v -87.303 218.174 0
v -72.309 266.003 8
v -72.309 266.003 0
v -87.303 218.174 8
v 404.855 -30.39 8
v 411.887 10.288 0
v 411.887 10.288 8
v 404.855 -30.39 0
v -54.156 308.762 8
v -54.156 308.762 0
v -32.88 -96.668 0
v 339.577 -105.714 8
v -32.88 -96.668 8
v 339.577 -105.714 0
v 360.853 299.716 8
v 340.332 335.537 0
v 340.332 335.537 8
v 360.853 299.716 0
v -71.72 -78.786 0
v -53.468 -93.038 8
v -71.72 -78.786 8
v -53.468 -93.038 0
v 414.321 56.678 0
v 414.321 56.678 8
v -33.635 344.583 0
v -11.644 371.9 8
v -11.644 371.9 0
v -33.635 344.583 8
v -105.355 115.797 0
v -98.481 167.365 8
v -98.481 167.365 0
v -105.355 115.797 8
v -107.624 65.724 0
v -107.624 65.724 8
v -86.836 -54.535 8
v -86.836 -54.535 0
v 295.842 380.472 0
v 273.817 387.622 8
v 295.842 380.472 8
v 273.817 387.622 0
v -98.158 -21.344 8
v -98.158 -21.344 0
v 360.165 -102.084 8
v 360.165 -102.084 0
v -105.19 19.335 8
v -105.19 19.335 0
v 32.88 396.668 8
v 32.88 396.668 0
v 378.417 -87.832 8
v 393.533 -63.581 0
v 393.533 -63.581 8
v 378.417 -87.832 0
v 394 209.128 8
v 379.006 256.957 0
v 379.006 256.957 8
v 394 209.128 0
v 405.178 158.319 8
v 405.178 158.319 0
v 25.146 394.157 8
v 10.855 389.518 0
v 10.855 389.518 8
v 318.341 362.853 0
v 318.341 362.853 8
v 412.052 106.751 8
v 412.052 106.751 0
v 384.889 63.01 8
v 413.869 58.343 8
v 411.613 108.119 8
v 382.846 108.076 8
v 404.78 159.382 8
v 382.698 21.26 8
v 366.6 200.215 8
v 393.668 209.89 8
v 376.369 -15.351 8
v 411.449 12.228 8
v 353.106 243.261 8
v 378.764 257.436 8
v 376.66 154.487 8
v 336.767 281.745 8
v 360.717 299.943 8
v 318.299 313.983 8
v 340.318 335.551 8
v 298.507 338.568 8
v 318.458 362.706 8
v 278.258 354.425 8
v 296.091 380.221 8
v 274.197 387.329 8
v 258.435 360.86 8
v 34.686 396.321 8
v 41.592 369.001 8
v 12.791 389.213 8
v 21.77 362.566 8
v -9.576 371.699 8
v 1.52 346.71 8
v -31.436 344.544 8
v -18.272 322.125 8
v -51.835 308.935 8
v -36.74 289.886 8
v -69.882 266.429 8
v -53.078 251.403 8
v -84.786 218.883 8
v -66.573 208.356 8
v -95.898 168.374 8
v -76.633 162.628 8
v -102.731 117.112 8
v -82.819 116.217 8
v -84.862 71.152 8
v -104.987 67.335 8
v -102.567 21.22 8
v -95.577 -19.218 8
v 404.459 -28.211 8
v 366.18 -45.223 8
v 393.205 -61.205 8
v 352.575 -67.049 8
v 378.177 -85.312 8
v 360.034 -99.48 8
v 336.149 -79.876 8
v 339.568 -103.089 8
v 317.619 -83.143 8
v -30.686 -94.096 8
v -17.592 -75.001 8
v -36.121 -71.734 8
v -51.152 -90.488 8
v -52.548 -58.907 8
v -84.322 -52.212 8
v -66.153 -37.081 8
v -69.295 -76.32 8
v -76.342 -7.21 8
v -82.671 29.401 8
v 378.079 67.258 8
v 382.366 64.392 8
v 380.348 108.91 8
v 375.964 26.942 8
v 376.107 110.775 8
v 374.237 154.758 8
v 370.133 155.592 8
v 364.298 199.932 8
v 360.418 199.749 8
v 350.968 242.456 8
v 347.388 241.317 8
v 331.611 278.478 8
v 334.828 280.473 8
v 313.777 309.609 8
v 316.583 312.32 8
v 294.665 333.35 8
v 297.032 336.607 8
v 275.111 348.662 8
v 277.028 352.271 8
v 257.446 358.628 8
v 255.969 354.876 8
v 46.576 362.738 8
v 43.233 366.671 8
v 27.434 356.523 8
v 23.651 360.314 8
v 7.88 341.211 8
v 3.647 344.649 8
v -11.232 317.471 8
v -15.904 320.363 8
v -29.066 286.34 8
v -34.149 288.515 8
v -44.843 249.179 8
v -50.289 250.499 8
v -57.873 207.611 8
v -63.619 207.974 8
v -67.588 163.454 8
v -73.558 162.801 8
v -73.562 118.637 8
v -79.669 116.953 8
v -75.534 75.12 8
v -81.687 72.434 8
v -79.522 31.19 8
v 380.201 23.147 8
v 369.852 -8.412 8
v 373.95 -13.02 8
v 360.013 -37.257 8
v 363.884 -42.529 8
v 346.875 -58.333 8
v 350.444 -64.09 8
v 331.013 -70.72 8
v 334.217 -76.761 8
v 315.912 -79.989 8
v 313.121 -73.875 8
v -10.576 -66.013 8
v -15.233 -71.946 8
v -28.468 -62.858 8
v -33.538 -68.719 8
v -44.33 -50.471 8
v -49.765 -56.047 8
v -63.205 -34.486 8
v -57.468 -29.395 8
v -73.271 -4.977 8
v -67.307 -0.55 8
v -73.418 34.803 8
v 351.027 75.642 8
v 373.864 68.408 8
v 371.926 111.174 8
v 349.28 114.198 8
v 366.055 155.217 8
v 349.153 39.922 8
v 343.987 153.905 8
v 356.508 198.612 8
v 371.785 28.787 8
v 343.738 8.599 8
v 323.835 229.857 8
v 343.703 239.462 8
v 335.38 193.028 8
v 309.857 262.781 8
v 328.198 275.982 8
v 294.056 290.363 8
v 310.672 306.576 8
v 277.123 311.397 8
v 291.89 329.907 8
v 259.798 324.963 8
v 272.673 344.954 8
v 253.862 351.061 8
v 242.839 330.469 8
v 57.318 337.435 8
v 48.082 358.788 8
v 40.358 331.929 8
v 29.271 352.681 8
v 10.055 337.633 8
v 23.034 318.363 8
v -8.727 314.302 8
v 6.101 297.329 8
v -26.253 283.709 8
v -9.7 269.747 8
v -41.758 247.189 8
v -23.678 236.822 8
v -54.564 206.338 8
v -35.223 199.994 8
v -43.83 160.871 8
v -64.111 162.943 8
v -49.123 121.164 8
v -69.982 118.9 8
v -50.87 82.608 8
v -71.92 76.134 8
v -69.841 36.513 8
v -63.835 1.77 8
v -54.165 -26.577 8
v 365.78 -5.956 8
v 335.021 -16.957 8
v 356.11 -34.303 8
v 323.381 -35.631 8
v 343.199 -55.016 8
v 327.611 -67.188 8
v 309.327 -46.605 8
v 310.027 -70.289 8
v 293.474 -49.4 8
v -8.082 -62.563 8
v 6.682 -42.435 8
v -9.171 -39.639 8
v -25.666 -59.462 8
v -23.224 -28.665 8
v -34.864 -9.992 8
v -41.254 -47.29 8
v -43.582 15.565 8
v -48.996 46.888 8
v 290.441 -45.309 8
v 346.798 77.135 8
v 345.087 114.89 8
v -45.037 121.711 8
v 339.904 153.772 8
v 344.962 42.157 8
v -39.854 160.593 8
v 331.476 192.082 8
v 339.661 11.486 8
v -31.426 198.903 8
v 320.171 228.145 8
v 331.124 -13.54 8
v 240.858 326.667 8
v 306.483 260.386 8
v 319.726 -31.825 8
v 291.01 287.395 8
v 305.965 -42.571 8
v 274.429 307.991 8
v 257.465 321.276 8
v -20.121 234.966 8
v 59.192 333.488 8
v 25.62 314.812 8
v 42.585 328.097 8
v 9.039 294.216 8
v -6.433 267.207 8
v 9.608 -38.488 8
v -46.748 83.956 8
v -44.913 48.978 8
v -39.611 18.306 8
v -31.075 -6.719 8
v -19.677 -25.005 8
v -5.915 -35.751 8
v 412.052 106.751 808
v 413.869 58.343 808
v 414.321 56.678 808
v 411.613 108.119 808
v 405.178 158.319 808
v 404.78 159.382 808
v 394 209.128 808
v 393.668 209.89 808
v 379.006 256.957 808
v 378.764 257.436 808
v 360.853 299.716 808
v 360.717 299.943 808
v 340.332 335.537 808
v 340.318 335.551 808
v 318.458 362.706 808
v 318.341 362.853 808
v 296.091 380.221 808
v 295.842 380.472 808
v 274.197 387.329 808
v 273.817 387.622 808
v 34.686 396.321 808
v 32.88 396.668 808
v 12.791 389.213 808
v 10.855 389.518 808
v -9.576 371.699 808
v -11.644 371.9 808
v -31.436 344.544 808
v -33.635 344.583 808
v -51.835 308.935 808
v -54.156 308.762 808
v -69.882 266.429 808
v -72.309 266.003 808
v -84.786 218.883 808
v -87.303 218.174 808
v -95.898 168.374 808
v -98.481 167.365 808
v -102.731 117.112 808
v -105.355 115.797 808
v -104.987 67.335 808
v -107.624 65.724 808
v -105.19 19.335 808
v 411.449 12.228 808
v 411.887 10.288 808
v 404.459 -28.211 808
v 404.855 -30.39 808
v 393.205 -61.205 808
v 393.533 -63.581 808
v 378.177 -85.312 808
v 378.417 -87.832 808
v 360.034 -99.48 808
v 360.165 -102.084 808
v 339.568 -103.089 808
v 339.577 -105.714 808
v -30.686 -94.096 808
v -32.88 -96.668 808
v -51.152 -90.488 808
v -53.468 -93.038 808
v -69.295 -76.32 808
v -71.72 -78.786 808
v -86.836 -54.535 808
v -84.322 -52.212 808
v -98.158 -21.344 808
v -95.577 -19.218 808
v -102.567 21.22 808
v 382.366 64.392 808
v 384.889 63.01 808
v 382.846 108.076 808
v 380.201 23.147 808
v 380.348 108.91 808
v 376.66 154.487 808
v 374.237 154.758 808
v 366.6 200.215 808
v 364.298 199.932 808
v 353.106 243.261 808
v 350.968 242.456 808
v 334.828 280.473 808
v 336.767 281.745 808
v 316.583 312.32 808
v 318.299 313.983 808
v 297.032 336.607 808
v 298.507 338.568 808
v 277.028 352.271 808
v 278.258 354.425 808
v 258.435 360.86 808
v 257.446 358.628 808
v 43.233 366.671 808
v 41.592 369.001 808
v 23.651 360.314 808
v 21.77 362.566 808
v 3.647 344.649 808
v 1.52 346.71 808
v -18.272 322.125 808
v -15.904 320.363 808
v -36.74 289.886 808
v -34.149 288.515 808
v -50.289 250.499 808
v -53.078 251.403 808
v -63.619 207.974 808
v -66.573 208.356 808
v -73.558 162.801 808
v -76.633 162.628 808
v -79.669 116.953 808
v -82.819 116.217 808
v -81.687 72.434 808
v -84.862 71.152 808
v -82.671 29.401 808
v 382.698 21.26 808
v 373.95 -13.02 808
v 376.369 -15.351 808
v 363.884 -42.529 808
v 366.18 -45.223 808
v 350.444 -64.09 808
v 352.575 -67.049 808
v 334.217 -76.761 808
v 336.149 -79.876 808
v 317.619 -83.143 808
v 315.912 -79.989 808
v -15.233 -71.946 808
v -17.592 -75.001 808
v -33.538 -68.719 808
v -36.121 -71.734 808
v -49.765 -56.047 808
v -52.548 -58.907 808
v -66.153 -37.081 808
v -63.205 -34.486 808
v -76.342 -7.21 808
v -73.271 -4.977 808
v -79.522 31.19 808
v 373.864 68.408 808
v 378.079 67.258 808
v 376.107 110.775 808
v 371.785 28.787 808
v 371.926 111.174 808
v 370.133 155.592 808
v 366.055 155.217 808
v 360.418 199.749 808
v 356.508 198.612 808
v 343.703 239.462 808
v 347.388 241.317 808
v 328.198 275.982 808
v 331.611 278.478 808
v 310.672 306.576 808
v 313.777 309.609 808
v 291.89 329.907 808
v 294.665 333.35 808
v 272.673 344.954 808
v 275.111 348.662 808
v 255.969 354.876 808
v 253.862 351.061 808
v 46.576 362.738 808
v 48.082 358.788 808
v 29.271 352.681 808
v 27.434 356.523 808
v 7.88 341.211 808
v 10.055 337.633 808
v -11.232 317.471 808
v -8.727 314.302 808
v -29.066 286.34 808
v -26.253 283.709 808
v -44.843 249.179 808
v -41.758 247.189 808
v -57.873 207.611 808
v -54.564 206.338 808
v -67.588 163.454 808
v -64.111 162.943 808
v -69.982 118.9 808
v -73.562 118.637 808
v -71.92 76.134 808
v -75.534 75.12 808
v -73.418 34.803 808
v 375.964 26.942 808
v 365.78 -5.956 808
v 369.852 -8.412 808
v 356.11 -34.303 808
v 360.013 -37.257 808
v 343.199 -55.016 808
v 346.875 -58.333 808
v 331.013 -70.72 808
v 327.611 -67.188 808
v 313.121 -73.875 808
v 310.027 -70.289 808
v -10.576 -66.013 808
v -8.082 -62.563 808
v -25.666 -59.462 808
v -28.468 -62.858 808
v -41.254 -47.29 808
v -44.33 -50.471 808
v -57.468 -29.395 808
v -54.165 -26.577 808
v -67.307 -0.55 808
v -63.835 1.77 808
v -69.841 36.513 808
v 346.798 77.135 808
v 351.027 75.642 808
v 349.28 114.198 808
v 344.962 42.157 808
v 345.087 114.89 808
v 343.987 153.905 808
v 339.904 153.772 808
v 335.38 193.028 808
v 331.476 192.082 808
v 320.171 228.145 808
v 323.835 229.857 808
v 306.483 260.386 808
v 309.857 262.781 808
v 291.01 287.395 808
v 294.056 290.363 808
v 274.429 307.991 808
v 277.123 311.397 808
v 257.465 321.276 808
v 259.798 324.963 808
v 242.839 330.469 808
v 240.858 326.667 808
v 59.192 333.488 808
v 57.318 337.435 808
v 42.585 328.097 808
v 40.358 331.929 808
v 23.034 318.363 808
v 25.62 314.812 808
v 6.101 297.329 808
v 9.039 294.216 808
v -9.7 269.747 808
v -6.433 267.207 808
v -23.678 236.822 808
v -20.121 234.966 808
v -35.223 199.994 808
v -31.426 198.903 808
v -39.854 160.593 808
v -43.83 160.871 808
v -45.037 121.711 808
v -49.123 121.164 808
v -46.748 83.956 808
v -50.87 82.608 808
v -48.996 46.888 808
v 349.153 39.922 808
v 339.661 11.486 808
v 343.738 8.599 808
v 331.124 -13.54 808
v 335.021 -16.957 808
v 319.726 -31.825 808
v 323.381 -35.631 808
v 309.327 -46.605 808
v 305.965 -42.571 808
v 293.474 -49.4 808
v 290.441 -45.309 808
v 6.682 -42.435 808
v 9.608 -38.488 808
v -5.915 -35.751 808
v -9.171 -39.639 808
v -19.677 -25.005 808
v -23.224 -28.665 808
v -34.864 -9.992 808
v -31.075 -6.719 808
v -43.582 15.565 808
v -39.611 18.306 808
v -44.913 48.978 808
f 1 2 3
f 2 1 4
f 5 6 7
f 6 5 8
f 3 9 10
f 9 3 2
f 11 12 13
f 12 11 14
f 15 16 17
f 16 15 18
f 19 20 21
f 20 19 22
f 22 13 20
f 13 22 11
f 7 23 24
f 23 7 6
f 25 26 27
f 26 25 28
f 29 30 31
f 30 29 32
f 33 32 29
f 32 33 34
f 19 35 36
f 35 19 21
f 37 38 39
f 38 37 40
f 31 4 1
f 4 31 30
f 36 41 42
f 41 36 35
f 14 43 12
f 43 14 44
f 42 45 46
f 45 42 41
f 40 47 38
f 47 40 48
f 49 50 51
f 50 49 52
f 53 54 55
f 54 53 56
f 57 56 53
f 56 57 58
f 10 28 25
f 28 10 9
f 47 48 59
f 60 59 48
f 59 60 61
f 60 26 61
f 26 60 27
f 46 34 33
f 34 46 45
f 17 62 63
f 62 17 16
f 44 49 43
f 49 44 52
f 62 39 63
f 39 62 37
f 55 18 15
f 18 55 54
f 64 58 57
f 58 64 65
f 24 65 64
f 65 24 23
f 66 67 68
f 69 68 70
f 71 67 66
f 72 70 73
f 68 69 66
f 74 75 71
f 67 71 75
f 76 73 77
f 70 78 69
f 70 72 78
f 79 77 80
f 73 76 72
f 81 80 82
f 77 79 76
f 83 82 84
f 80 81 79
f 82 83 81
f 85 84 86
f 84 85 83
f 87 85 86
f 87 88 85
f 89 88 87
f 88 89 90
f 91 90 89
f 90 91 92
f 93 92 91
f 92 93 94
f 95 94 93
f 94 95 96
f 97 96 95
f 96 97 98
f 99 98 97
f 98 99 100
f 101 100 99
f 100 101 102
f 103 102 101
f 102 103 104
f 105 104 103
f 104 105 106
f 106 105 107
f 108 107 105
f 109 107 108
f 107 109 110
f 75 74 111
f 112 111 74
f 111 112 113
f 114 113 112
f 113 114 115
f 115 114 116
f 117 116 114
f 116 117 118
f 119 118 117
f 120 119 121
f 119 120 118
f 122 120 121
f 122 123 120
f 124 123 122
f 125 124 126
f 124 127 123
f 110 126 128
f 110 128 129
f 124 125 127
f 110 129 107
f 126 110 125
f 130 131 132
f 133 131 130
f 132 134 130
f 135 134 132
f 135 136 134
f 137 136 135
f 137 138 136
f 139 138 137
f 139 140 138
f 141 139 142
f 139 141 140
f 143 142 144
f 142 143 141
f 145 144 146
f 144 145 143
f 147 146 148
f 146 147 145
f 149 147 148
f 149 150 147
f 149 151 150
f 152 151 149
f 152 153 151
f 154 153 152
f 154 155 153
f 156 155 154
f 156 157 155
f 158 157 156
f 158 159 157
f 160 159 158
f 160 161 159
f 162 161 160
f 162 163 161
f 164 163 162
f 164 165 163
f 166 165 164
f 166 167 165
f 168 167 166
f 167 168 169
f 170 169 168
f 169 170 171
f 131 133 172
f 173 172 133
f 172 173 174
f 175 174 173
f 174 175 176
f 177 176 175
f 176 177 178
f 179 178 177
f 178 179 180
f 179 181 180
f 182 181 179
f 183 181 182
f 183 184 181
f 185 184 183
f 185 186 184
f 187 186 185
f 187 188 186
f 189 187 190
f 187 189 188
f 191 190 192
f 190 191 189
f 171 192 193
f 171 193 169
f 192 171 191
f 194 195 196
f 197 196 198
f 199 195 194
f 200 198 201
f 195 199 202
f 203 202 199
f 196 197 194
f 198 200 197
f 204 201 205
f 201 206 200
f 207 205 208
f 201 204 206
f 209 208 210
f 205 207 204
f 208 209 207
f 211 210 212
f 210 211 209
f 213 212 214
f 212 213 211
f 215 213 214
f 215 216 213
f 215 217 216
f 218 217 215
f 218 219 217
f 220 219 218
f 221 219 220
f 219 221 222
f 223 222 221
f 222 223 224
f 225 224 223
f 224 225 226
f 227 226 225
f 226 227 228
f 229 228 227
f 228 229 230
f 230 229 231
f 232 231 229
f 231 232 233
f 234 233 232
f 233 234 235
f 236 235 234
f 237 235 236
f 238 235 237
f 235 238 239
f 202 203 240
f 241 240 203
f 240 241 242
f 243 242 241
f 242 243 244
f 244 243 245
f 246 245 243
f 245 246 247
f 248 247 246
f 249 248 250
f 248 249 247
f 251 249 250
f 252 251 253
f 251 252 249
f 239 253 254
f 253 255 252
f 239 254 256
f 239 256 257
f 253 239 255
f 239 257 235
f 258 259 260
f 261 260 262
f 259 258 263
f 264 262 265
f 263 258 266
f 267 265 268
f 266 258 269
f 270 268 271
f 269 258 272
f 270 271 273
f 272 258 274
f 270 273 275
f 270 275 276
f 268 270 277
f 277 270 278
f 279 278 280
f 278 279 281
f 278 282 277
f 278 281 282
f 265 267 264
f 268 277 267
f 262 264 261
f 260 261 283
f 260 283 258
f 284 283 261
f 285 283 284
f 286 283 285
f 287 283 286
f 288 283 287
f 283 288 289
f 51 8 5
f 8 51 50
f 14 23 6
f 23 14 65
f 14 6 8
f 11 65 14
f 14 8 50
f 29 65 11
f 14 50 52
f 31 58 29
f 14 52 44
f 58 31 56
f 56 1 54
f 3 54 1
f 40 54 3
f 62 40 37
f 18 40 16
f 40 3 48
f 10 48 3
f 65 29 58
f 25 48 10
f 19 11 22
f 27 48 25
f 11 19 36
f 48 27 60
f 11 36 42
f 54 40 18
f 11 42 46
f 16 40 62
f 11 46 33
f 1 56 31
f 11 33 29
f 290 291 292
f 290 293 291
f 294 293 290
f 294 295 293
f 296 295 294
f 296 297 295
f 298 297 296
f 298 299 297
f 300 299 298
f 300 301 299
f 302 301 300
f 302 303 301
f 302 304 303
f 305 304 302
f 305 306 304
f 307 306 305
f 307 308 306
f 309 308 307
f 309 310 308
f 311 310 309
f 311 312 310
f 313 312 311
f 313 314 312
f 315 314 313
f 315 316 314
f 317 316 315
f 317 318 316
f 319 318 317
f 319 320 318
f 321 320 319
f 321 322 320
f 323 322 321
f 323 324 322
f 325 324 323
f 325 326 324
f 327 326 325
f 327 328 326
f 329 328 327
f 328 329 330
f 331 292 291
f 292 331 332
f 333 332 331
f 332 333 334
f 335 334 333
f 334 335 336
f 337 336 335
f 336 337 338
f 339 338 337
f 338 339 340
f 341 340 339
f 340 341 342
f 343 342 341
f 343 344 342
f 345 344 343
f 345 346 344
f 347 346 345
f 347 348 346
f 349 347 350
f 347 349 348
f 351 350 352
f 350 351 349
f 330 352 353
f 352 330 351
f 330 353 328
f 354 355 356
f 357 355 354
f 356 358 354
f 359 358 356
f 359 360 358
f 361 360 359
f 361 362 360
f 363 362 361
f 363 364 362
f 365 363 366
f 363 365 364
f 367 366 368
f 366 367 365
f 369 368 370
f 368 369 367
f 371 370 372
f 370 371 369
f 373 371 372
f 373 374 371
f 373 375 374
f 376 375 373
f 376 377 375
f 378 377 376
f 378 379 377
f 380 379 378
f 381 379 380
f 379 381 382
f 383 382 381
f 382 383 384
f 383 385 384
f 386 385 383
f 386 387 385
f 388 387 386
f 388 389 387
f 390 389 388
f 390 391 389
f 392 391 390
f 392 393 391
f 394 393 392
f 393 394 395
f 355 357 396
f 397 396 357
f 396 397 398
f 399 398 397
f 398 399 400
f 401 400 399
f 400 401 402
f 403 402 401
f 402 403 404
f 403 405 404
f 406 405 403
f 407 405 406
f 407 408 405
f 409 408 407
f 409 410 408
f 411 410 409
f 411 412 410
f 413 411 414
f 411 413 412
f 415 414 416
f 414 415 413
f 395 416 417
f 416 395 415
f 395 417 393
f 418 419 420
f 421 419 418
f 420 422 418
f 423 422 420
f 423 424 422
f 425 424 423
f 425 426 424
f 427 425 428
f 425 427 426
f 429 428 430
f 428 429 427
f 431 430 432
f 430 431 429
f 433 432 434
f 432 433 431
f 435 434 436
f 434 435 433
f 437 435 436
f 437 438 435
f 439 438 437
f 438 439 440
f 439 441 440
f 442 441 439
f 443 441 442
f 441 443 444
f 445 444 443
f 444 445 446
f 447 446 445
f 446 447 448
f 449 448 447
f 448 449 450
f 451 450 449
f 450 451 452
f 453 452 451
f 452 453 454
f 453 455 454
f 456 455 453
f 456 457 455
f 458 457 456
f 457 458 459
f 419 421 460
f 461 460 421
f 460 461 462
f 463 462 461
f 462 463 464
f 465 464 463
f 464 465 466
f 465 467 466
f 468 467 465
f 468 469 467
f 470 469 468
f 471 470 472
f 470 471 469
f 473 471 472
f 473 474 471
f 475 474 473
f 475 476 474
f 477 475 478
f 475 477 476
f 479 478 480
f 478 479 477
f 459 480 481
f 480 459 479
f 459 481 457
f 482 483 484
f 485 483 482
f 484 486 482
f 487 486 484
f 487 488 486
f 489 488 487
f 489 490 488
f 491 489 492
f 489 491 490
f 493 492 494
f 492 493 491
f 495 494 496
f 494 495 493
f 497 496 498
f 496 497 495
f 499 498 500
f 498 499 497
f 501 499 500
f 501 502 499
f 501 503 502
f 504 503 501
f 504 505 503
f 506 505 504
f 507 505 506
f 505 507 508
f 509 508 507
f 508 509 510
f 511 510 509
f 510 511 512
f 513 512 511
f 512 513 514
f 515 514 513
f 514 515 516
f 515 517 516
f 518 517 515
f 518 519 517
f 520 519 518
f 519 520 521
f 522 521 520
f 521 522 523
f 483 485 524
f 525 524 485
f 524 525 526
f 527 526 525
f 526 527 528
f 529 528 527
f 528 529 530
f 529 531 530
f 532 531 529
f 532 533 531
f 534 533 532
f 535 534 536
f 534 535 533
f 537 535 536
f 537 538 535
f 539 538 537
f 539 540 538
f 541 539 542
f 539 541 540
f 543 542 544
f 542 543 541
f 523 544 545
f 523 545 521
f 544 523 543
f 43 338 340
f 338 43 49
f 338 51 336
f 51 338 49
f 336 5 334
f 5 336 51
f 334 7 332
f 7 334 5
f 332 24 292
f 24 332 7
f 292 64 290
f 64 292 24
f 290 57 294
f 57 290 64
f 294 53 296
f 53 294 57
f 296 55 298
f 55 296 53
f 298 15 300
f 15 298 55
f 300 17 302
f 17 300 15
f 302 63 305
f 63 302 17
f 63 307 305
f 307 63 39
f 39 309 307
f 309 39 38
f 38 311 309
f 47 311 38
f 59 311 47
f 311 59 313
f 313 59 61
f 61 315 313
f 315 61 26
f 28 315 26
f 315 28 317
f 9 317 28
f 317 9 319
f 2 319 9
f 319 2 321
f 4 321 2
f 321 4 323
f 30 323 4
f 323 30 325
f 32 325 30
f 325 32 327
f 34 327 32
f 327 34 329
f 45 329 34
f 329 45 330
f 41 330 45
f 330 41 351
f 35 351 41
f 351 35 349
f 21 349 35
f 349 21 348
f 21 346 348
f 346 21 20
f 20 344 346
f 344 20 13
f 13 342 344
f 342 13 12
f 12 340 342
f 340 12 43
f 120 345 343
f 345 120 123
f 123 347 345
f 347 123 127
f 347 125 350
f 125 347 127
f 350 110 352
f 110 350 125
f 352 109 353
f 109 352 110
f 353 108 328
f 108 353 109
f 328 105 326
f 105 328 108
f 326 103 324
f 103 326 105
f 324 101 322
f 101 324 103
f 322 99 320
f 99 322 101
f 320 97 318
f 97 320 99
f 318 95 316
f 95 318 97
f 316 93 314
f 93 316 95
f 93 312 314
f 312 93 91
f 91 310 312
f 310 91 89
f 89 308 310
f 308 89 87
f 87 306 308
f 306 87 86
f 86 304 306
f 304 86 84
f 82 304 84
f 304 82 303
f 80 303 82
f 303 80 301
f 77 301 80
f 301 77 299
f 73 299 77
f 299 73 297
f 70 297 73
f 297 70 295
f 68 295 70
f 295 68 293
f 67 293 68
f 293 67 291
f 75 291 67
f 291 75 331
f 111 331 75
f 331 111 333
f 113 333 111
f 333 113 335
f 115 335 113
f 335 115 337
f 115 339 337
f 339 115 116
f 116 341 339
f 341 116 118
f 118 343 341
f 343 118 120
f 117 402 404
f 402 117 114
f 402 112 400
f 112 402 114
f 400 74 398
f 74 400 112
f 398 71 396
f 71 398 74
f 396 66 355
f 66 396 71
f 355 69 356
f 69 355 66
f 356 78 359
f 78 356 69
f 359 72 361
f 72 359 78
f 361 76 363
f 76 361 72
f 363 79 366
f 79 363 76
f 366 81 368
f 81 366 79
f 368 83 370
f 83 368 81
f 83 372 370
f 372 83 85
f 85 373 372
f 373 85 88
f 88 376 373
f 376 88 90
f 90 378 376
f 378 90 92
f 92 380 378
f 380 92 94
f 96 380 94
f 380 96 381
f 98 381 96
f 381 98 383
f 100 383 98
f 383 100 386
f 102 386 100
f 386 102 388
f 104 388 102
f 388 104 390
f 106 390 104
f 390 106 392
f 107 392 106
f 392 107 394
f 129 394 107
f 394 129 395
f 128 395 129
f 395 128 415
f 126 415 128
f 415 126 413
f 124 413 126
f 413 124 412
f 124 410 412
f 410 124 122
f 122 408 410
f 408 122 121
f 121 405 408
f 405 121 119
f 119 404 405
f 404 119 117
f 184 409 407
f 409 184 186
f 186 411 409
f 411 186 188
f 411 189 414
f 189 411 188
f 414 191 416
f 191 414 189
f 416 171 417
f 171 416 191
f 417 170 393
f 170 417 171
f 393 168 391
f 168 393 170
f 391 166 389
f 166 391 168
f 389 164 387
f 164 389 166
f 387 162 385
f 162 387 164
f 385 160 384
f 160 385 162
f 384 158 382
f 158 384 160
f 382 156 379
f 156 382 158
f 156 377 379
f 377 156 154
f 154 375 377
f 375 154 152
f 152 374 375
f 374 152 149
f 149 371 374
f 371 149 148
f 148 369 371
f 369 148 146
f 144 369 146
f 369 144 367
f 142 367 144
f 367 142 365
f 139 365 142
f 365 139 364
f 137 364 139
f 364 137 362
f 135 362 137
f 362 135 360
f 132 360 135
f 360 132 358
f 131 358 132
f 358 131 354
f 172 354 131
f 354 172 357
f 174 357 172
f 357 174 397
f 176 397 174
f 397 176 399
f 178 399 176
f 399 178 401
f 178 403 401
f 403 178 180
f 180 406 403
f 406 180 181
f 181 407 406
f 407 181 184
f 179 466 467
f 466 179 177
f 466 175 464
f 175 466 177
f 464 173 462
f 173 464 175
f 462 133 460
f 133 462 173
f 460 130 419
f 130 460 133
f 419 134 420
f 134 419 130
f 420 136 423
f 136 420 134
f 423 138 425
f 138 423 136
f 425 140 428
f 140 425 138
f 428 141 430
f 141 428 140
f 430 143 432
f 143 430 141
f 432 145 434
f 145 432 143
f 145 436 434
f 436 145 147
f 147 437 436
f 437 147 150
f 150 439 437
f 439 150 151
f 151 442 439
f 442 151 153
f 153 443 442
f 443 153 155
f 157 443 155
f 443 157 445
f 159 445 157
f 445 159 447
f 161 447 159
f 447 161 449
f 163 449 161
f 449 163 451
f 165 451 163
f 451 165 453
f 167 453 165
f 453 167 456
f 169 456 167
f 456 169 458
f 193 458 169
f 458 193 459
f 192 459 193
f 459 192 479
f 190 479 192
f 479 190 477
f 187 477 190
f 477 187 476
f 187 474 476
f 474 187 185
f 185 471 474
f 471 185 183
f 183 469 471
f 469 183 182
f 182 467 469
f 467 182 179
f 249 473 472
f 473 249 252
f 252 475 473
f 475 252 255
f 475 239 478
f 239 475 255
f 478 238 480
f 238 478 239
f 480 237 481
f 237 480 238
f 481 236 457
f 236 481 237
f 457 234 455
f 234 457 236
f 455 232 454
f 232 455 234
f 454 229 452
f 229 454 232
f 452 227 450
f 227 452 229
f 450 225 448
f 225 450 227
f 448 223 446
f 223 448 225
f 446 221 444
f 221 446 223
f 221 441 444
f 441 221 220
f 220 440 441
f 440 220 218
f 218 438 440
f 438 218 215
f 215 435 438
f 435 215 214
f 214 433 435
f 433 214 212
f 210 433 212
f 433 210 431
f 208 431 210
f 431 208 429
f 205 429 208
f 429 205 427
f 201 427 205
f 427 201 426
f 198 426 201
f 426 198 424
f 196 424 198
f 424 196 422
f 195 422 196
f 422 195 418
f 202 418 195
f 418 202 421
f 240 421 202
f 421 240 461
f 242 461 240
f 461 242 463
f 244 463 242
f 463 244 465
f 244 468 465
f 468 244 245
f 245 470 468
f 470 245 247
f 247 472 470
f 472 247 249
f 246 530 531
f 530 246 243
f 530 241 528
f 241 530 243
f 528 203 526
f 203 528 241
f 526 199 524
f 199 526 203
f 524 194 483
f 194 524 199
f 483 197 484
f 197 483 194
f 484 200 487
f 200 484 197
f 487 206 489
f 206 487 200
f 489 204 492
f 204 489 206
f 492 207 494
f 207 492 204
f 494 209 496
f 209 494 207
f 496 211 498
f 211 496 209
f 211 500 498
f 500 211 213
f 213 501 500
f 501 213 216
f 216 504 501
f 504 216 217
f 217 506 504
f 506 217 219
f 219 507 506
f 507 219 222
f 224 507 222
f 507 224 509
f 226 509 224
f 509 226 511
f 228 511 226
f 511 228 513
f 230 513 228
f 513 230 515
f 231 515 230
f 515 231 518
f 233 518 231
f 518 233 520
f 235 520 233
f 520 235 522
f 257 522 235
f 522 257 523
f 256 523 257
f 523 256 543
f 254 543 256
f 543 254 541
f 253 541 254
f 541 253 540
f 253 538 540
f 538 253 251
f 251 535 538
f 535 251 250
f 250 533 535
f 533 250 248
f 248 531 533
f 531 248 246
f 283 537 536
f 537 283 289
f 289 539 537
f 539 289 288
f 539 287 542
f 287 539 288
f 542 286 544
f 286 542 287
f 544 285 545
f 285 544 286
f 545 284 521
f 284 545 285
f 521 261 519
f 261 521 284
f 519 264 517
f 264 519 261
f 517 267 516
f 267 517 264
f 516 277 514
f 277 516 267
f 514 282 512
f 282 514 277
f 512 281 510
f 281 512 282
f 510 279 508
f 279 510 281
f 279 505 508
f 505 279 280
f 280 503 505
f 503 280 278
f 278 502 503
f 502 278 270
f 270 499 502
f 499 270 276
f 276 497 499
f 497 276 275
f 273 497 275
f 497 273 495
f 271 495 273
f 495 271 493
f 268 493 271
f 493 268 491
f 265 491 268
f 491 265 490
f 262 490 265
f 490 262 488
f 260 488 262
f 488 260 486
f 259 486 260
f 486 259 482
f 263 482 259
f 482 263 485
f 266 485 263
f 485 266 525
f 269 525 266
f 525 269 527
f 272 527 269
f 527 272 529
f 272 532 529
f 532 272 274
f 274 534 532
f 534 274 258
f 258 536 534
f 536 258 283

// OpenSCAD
corner_radius = 50;
speaker_size = 228; // 9 in.
front_baffle_width = speaker_size + 2 * corner_radius + 10; // 10mm extra margin
depth = 250; // arbitrary
rear_width = speaker_size * 0.68; // arbitrary

wall_ellipse_aspect_ratio = 2.5;
wall_ellipse_unscaled_radius = 100;
wall_ellipse_y_offset = wall_ellipse_unscaled_radius * 1.5;
wall_ellipse_angle_deg = 10;
right_wall_front_baffle_width_offset = 20; // FIXME seems to work - why?

base_height = 8;
main_volume_height = 800;

outer_cutout_x_thickness = 20;
outer_cutout_y_offset = 0;
outer_cutout_x_offset_from_wall = 2;
outer_cutout_y_offset_from_baffle = 2;

// Calculate so that we end up with 2mm thickness.
outer_cutout_scaling_factor_from_wall_size = (front_baffle_width - outer_cutout_x_offset_from_wall) / front_baffle_width;

middle_cutout_thickness = 3;
middle_cutout_offset_from_outer_cutout = 24;
middle_cutout_x_offset = 14;
middle_cutout_y_offset = 14;
middle_cutout_inner_x_offset = 18;
middle_cutout_inner_y_offset = 15;
middle_cutout_outer_wall_scale_factor = outer_cutout_scaling_factor_from_wall_size - 0.105;
middle_cutout_inner_wall_scale_factor = middle_cutout_outer_wall_scale_factor - 0.02;

inner_cutout_offset_from_outer_cutout = 20;
inner_cutout_outside_scale_factor = middle_cutout_inner_wall_scale_factor - 0.015;
inner_cutout_inner_wall_offset = 32;
inner_cutout_inner_wall_scale_factor = 0.77;

main_volume_cutout_offset = 34.4;
main_volume_cutout_scale_factor = 0.754;

module wall_ellipse() {
    scale([1, wall_ellipse_aspect_ratio, 1]) {
        circle(wall_ellipse_unscaled_radius);
    } 
}

module left_wall() {
    translate([0, wall_ellipse_y_offset, 0]) {
        rotate([0, 0, -wall_ellipse_angle_deg])
        wall_ellipse();
    }
}

module right_wall() {
    translate([front_baffle_width + right_wall_front_baffle_width_offset, 0, 0]) {
        rotate([0, 0, 2 * wall_ellipse_angle_deg])
        left_wall();
    }
}

module front_baffle() {
    hull() {
        circle(corner_radius);
        translate([front_baffle_width, 0, 0]) {
            circle(corner_radius);
        }
    }    
}

module base_cross_section() {
    hull() {
        left_wall();
        right_wall();
        front_baffle();
    }
}

module base() {
    linear_extrude(base_height) {
        base_cross_section();
    }
}

module left_wall_cutout_ellipse_slice() {
    rotate([0,0,-wall_ellipse_angle_deg])
    difference() {
        wall_ellipse();
        translate([outer_cutout_x_thickness,0,0])
        wall_ellipse();
    }
}

module left_wall_cutout_ellipse_thin_slice() {
    rotate([0,0,-wall_ellipse_angle_deg])
    difference() {
        wall_ellipse();
        translate([middle_cutout_thickness,0,0])
        wall_ellipse();
    }
}

module left_wall_cutouts() {
    difference() {
        union() {
            left_wall_cutout_ellipse_slice();
            translate([middle_cutout_offset_from_outer_cutout,0,0])
            left_wall_cutout_ellipse_thin_slice();
            translate([inner_cutout_offset_from_outer_cutout,0,0])
            left_wall_cutout_ellipse_slice();    
        }
        // FIXME this slice off of the end where the cutouts join together, which I don't want, is still WIP
        translate(50, 220, 0)
        square(100);
    }
}

module outer_cutout() {
    difference() {
        translate([outer_cutout_x_offset_from_wall, outer_cutout_y_offset_from_baffle, 0])
        scale([outer_cutout_scaling_factor_from_wall_size, outer_cutout_scaling_factor_from_wall_size])
        base_cross_section();
        translate([12, 12, 0])
        scale([0.9, 0.9])
        base_cross_section();
    }
}

module middle_cutout() {
    difference() {
        translate([middle_cutout_x_offset, middle_cutout_y_offset, 0])
        scale([middle_cutout_outer_wall_scale_factor, middle_cutout_outer_wall_scale_factor])
        base_cross_section();
        translate([middle_cutout_inner_x_offset, middle_cutout_inner_x_offset, 0])
        scale([middle_cutout_inner_wall_scale_factor, middle_cutout_inner_wall_scale_factor])
        base_cross_section();
    }
}

module inner_cutout() {
    difference() {
        translate([inner_cutout_offset_from_outer_cutout, inner_cutout_offset_from_outer_cutout, 0])
        scale([inner_cutout_outside_scale_factor, inner_cutout_outside_scale_factor])
        base_cross_section();
        translate([inner_cutout_inner_wall_offset, inner_cutout_inner_wall_offset, 0])
        scale([inner_cutout_inner_wall_scale_factor, inner_cutout_inner_wall_scale_factor])
        base_cross_section();
    }
}

module main_volume_cutout() {
    translate([main_volume_cutout_offset, main_volume_cutout_offset, 0])
    scale([main_volume_cutout_scale_factor, main_volume_cutout_scale_factor])
    base_cross_section();
}

module main_volume_cross_section() {
    difference() {
        base_cross_section();
        outer_cutout();
        middle_cutout();
        inner_cutout();
        main_volume_cutout();
    }
}
// FIXME trying 3 concentrically sized cutouts instead      
//        translate([0, 150, 0])
//        left_wall_cutouts();
//    }    
//}

module main_volume() {
    translate([0,0,base_height])
    linear_extrude(main_volume_height)
    main_volume_cross_section();
}

base();
main_volume();
